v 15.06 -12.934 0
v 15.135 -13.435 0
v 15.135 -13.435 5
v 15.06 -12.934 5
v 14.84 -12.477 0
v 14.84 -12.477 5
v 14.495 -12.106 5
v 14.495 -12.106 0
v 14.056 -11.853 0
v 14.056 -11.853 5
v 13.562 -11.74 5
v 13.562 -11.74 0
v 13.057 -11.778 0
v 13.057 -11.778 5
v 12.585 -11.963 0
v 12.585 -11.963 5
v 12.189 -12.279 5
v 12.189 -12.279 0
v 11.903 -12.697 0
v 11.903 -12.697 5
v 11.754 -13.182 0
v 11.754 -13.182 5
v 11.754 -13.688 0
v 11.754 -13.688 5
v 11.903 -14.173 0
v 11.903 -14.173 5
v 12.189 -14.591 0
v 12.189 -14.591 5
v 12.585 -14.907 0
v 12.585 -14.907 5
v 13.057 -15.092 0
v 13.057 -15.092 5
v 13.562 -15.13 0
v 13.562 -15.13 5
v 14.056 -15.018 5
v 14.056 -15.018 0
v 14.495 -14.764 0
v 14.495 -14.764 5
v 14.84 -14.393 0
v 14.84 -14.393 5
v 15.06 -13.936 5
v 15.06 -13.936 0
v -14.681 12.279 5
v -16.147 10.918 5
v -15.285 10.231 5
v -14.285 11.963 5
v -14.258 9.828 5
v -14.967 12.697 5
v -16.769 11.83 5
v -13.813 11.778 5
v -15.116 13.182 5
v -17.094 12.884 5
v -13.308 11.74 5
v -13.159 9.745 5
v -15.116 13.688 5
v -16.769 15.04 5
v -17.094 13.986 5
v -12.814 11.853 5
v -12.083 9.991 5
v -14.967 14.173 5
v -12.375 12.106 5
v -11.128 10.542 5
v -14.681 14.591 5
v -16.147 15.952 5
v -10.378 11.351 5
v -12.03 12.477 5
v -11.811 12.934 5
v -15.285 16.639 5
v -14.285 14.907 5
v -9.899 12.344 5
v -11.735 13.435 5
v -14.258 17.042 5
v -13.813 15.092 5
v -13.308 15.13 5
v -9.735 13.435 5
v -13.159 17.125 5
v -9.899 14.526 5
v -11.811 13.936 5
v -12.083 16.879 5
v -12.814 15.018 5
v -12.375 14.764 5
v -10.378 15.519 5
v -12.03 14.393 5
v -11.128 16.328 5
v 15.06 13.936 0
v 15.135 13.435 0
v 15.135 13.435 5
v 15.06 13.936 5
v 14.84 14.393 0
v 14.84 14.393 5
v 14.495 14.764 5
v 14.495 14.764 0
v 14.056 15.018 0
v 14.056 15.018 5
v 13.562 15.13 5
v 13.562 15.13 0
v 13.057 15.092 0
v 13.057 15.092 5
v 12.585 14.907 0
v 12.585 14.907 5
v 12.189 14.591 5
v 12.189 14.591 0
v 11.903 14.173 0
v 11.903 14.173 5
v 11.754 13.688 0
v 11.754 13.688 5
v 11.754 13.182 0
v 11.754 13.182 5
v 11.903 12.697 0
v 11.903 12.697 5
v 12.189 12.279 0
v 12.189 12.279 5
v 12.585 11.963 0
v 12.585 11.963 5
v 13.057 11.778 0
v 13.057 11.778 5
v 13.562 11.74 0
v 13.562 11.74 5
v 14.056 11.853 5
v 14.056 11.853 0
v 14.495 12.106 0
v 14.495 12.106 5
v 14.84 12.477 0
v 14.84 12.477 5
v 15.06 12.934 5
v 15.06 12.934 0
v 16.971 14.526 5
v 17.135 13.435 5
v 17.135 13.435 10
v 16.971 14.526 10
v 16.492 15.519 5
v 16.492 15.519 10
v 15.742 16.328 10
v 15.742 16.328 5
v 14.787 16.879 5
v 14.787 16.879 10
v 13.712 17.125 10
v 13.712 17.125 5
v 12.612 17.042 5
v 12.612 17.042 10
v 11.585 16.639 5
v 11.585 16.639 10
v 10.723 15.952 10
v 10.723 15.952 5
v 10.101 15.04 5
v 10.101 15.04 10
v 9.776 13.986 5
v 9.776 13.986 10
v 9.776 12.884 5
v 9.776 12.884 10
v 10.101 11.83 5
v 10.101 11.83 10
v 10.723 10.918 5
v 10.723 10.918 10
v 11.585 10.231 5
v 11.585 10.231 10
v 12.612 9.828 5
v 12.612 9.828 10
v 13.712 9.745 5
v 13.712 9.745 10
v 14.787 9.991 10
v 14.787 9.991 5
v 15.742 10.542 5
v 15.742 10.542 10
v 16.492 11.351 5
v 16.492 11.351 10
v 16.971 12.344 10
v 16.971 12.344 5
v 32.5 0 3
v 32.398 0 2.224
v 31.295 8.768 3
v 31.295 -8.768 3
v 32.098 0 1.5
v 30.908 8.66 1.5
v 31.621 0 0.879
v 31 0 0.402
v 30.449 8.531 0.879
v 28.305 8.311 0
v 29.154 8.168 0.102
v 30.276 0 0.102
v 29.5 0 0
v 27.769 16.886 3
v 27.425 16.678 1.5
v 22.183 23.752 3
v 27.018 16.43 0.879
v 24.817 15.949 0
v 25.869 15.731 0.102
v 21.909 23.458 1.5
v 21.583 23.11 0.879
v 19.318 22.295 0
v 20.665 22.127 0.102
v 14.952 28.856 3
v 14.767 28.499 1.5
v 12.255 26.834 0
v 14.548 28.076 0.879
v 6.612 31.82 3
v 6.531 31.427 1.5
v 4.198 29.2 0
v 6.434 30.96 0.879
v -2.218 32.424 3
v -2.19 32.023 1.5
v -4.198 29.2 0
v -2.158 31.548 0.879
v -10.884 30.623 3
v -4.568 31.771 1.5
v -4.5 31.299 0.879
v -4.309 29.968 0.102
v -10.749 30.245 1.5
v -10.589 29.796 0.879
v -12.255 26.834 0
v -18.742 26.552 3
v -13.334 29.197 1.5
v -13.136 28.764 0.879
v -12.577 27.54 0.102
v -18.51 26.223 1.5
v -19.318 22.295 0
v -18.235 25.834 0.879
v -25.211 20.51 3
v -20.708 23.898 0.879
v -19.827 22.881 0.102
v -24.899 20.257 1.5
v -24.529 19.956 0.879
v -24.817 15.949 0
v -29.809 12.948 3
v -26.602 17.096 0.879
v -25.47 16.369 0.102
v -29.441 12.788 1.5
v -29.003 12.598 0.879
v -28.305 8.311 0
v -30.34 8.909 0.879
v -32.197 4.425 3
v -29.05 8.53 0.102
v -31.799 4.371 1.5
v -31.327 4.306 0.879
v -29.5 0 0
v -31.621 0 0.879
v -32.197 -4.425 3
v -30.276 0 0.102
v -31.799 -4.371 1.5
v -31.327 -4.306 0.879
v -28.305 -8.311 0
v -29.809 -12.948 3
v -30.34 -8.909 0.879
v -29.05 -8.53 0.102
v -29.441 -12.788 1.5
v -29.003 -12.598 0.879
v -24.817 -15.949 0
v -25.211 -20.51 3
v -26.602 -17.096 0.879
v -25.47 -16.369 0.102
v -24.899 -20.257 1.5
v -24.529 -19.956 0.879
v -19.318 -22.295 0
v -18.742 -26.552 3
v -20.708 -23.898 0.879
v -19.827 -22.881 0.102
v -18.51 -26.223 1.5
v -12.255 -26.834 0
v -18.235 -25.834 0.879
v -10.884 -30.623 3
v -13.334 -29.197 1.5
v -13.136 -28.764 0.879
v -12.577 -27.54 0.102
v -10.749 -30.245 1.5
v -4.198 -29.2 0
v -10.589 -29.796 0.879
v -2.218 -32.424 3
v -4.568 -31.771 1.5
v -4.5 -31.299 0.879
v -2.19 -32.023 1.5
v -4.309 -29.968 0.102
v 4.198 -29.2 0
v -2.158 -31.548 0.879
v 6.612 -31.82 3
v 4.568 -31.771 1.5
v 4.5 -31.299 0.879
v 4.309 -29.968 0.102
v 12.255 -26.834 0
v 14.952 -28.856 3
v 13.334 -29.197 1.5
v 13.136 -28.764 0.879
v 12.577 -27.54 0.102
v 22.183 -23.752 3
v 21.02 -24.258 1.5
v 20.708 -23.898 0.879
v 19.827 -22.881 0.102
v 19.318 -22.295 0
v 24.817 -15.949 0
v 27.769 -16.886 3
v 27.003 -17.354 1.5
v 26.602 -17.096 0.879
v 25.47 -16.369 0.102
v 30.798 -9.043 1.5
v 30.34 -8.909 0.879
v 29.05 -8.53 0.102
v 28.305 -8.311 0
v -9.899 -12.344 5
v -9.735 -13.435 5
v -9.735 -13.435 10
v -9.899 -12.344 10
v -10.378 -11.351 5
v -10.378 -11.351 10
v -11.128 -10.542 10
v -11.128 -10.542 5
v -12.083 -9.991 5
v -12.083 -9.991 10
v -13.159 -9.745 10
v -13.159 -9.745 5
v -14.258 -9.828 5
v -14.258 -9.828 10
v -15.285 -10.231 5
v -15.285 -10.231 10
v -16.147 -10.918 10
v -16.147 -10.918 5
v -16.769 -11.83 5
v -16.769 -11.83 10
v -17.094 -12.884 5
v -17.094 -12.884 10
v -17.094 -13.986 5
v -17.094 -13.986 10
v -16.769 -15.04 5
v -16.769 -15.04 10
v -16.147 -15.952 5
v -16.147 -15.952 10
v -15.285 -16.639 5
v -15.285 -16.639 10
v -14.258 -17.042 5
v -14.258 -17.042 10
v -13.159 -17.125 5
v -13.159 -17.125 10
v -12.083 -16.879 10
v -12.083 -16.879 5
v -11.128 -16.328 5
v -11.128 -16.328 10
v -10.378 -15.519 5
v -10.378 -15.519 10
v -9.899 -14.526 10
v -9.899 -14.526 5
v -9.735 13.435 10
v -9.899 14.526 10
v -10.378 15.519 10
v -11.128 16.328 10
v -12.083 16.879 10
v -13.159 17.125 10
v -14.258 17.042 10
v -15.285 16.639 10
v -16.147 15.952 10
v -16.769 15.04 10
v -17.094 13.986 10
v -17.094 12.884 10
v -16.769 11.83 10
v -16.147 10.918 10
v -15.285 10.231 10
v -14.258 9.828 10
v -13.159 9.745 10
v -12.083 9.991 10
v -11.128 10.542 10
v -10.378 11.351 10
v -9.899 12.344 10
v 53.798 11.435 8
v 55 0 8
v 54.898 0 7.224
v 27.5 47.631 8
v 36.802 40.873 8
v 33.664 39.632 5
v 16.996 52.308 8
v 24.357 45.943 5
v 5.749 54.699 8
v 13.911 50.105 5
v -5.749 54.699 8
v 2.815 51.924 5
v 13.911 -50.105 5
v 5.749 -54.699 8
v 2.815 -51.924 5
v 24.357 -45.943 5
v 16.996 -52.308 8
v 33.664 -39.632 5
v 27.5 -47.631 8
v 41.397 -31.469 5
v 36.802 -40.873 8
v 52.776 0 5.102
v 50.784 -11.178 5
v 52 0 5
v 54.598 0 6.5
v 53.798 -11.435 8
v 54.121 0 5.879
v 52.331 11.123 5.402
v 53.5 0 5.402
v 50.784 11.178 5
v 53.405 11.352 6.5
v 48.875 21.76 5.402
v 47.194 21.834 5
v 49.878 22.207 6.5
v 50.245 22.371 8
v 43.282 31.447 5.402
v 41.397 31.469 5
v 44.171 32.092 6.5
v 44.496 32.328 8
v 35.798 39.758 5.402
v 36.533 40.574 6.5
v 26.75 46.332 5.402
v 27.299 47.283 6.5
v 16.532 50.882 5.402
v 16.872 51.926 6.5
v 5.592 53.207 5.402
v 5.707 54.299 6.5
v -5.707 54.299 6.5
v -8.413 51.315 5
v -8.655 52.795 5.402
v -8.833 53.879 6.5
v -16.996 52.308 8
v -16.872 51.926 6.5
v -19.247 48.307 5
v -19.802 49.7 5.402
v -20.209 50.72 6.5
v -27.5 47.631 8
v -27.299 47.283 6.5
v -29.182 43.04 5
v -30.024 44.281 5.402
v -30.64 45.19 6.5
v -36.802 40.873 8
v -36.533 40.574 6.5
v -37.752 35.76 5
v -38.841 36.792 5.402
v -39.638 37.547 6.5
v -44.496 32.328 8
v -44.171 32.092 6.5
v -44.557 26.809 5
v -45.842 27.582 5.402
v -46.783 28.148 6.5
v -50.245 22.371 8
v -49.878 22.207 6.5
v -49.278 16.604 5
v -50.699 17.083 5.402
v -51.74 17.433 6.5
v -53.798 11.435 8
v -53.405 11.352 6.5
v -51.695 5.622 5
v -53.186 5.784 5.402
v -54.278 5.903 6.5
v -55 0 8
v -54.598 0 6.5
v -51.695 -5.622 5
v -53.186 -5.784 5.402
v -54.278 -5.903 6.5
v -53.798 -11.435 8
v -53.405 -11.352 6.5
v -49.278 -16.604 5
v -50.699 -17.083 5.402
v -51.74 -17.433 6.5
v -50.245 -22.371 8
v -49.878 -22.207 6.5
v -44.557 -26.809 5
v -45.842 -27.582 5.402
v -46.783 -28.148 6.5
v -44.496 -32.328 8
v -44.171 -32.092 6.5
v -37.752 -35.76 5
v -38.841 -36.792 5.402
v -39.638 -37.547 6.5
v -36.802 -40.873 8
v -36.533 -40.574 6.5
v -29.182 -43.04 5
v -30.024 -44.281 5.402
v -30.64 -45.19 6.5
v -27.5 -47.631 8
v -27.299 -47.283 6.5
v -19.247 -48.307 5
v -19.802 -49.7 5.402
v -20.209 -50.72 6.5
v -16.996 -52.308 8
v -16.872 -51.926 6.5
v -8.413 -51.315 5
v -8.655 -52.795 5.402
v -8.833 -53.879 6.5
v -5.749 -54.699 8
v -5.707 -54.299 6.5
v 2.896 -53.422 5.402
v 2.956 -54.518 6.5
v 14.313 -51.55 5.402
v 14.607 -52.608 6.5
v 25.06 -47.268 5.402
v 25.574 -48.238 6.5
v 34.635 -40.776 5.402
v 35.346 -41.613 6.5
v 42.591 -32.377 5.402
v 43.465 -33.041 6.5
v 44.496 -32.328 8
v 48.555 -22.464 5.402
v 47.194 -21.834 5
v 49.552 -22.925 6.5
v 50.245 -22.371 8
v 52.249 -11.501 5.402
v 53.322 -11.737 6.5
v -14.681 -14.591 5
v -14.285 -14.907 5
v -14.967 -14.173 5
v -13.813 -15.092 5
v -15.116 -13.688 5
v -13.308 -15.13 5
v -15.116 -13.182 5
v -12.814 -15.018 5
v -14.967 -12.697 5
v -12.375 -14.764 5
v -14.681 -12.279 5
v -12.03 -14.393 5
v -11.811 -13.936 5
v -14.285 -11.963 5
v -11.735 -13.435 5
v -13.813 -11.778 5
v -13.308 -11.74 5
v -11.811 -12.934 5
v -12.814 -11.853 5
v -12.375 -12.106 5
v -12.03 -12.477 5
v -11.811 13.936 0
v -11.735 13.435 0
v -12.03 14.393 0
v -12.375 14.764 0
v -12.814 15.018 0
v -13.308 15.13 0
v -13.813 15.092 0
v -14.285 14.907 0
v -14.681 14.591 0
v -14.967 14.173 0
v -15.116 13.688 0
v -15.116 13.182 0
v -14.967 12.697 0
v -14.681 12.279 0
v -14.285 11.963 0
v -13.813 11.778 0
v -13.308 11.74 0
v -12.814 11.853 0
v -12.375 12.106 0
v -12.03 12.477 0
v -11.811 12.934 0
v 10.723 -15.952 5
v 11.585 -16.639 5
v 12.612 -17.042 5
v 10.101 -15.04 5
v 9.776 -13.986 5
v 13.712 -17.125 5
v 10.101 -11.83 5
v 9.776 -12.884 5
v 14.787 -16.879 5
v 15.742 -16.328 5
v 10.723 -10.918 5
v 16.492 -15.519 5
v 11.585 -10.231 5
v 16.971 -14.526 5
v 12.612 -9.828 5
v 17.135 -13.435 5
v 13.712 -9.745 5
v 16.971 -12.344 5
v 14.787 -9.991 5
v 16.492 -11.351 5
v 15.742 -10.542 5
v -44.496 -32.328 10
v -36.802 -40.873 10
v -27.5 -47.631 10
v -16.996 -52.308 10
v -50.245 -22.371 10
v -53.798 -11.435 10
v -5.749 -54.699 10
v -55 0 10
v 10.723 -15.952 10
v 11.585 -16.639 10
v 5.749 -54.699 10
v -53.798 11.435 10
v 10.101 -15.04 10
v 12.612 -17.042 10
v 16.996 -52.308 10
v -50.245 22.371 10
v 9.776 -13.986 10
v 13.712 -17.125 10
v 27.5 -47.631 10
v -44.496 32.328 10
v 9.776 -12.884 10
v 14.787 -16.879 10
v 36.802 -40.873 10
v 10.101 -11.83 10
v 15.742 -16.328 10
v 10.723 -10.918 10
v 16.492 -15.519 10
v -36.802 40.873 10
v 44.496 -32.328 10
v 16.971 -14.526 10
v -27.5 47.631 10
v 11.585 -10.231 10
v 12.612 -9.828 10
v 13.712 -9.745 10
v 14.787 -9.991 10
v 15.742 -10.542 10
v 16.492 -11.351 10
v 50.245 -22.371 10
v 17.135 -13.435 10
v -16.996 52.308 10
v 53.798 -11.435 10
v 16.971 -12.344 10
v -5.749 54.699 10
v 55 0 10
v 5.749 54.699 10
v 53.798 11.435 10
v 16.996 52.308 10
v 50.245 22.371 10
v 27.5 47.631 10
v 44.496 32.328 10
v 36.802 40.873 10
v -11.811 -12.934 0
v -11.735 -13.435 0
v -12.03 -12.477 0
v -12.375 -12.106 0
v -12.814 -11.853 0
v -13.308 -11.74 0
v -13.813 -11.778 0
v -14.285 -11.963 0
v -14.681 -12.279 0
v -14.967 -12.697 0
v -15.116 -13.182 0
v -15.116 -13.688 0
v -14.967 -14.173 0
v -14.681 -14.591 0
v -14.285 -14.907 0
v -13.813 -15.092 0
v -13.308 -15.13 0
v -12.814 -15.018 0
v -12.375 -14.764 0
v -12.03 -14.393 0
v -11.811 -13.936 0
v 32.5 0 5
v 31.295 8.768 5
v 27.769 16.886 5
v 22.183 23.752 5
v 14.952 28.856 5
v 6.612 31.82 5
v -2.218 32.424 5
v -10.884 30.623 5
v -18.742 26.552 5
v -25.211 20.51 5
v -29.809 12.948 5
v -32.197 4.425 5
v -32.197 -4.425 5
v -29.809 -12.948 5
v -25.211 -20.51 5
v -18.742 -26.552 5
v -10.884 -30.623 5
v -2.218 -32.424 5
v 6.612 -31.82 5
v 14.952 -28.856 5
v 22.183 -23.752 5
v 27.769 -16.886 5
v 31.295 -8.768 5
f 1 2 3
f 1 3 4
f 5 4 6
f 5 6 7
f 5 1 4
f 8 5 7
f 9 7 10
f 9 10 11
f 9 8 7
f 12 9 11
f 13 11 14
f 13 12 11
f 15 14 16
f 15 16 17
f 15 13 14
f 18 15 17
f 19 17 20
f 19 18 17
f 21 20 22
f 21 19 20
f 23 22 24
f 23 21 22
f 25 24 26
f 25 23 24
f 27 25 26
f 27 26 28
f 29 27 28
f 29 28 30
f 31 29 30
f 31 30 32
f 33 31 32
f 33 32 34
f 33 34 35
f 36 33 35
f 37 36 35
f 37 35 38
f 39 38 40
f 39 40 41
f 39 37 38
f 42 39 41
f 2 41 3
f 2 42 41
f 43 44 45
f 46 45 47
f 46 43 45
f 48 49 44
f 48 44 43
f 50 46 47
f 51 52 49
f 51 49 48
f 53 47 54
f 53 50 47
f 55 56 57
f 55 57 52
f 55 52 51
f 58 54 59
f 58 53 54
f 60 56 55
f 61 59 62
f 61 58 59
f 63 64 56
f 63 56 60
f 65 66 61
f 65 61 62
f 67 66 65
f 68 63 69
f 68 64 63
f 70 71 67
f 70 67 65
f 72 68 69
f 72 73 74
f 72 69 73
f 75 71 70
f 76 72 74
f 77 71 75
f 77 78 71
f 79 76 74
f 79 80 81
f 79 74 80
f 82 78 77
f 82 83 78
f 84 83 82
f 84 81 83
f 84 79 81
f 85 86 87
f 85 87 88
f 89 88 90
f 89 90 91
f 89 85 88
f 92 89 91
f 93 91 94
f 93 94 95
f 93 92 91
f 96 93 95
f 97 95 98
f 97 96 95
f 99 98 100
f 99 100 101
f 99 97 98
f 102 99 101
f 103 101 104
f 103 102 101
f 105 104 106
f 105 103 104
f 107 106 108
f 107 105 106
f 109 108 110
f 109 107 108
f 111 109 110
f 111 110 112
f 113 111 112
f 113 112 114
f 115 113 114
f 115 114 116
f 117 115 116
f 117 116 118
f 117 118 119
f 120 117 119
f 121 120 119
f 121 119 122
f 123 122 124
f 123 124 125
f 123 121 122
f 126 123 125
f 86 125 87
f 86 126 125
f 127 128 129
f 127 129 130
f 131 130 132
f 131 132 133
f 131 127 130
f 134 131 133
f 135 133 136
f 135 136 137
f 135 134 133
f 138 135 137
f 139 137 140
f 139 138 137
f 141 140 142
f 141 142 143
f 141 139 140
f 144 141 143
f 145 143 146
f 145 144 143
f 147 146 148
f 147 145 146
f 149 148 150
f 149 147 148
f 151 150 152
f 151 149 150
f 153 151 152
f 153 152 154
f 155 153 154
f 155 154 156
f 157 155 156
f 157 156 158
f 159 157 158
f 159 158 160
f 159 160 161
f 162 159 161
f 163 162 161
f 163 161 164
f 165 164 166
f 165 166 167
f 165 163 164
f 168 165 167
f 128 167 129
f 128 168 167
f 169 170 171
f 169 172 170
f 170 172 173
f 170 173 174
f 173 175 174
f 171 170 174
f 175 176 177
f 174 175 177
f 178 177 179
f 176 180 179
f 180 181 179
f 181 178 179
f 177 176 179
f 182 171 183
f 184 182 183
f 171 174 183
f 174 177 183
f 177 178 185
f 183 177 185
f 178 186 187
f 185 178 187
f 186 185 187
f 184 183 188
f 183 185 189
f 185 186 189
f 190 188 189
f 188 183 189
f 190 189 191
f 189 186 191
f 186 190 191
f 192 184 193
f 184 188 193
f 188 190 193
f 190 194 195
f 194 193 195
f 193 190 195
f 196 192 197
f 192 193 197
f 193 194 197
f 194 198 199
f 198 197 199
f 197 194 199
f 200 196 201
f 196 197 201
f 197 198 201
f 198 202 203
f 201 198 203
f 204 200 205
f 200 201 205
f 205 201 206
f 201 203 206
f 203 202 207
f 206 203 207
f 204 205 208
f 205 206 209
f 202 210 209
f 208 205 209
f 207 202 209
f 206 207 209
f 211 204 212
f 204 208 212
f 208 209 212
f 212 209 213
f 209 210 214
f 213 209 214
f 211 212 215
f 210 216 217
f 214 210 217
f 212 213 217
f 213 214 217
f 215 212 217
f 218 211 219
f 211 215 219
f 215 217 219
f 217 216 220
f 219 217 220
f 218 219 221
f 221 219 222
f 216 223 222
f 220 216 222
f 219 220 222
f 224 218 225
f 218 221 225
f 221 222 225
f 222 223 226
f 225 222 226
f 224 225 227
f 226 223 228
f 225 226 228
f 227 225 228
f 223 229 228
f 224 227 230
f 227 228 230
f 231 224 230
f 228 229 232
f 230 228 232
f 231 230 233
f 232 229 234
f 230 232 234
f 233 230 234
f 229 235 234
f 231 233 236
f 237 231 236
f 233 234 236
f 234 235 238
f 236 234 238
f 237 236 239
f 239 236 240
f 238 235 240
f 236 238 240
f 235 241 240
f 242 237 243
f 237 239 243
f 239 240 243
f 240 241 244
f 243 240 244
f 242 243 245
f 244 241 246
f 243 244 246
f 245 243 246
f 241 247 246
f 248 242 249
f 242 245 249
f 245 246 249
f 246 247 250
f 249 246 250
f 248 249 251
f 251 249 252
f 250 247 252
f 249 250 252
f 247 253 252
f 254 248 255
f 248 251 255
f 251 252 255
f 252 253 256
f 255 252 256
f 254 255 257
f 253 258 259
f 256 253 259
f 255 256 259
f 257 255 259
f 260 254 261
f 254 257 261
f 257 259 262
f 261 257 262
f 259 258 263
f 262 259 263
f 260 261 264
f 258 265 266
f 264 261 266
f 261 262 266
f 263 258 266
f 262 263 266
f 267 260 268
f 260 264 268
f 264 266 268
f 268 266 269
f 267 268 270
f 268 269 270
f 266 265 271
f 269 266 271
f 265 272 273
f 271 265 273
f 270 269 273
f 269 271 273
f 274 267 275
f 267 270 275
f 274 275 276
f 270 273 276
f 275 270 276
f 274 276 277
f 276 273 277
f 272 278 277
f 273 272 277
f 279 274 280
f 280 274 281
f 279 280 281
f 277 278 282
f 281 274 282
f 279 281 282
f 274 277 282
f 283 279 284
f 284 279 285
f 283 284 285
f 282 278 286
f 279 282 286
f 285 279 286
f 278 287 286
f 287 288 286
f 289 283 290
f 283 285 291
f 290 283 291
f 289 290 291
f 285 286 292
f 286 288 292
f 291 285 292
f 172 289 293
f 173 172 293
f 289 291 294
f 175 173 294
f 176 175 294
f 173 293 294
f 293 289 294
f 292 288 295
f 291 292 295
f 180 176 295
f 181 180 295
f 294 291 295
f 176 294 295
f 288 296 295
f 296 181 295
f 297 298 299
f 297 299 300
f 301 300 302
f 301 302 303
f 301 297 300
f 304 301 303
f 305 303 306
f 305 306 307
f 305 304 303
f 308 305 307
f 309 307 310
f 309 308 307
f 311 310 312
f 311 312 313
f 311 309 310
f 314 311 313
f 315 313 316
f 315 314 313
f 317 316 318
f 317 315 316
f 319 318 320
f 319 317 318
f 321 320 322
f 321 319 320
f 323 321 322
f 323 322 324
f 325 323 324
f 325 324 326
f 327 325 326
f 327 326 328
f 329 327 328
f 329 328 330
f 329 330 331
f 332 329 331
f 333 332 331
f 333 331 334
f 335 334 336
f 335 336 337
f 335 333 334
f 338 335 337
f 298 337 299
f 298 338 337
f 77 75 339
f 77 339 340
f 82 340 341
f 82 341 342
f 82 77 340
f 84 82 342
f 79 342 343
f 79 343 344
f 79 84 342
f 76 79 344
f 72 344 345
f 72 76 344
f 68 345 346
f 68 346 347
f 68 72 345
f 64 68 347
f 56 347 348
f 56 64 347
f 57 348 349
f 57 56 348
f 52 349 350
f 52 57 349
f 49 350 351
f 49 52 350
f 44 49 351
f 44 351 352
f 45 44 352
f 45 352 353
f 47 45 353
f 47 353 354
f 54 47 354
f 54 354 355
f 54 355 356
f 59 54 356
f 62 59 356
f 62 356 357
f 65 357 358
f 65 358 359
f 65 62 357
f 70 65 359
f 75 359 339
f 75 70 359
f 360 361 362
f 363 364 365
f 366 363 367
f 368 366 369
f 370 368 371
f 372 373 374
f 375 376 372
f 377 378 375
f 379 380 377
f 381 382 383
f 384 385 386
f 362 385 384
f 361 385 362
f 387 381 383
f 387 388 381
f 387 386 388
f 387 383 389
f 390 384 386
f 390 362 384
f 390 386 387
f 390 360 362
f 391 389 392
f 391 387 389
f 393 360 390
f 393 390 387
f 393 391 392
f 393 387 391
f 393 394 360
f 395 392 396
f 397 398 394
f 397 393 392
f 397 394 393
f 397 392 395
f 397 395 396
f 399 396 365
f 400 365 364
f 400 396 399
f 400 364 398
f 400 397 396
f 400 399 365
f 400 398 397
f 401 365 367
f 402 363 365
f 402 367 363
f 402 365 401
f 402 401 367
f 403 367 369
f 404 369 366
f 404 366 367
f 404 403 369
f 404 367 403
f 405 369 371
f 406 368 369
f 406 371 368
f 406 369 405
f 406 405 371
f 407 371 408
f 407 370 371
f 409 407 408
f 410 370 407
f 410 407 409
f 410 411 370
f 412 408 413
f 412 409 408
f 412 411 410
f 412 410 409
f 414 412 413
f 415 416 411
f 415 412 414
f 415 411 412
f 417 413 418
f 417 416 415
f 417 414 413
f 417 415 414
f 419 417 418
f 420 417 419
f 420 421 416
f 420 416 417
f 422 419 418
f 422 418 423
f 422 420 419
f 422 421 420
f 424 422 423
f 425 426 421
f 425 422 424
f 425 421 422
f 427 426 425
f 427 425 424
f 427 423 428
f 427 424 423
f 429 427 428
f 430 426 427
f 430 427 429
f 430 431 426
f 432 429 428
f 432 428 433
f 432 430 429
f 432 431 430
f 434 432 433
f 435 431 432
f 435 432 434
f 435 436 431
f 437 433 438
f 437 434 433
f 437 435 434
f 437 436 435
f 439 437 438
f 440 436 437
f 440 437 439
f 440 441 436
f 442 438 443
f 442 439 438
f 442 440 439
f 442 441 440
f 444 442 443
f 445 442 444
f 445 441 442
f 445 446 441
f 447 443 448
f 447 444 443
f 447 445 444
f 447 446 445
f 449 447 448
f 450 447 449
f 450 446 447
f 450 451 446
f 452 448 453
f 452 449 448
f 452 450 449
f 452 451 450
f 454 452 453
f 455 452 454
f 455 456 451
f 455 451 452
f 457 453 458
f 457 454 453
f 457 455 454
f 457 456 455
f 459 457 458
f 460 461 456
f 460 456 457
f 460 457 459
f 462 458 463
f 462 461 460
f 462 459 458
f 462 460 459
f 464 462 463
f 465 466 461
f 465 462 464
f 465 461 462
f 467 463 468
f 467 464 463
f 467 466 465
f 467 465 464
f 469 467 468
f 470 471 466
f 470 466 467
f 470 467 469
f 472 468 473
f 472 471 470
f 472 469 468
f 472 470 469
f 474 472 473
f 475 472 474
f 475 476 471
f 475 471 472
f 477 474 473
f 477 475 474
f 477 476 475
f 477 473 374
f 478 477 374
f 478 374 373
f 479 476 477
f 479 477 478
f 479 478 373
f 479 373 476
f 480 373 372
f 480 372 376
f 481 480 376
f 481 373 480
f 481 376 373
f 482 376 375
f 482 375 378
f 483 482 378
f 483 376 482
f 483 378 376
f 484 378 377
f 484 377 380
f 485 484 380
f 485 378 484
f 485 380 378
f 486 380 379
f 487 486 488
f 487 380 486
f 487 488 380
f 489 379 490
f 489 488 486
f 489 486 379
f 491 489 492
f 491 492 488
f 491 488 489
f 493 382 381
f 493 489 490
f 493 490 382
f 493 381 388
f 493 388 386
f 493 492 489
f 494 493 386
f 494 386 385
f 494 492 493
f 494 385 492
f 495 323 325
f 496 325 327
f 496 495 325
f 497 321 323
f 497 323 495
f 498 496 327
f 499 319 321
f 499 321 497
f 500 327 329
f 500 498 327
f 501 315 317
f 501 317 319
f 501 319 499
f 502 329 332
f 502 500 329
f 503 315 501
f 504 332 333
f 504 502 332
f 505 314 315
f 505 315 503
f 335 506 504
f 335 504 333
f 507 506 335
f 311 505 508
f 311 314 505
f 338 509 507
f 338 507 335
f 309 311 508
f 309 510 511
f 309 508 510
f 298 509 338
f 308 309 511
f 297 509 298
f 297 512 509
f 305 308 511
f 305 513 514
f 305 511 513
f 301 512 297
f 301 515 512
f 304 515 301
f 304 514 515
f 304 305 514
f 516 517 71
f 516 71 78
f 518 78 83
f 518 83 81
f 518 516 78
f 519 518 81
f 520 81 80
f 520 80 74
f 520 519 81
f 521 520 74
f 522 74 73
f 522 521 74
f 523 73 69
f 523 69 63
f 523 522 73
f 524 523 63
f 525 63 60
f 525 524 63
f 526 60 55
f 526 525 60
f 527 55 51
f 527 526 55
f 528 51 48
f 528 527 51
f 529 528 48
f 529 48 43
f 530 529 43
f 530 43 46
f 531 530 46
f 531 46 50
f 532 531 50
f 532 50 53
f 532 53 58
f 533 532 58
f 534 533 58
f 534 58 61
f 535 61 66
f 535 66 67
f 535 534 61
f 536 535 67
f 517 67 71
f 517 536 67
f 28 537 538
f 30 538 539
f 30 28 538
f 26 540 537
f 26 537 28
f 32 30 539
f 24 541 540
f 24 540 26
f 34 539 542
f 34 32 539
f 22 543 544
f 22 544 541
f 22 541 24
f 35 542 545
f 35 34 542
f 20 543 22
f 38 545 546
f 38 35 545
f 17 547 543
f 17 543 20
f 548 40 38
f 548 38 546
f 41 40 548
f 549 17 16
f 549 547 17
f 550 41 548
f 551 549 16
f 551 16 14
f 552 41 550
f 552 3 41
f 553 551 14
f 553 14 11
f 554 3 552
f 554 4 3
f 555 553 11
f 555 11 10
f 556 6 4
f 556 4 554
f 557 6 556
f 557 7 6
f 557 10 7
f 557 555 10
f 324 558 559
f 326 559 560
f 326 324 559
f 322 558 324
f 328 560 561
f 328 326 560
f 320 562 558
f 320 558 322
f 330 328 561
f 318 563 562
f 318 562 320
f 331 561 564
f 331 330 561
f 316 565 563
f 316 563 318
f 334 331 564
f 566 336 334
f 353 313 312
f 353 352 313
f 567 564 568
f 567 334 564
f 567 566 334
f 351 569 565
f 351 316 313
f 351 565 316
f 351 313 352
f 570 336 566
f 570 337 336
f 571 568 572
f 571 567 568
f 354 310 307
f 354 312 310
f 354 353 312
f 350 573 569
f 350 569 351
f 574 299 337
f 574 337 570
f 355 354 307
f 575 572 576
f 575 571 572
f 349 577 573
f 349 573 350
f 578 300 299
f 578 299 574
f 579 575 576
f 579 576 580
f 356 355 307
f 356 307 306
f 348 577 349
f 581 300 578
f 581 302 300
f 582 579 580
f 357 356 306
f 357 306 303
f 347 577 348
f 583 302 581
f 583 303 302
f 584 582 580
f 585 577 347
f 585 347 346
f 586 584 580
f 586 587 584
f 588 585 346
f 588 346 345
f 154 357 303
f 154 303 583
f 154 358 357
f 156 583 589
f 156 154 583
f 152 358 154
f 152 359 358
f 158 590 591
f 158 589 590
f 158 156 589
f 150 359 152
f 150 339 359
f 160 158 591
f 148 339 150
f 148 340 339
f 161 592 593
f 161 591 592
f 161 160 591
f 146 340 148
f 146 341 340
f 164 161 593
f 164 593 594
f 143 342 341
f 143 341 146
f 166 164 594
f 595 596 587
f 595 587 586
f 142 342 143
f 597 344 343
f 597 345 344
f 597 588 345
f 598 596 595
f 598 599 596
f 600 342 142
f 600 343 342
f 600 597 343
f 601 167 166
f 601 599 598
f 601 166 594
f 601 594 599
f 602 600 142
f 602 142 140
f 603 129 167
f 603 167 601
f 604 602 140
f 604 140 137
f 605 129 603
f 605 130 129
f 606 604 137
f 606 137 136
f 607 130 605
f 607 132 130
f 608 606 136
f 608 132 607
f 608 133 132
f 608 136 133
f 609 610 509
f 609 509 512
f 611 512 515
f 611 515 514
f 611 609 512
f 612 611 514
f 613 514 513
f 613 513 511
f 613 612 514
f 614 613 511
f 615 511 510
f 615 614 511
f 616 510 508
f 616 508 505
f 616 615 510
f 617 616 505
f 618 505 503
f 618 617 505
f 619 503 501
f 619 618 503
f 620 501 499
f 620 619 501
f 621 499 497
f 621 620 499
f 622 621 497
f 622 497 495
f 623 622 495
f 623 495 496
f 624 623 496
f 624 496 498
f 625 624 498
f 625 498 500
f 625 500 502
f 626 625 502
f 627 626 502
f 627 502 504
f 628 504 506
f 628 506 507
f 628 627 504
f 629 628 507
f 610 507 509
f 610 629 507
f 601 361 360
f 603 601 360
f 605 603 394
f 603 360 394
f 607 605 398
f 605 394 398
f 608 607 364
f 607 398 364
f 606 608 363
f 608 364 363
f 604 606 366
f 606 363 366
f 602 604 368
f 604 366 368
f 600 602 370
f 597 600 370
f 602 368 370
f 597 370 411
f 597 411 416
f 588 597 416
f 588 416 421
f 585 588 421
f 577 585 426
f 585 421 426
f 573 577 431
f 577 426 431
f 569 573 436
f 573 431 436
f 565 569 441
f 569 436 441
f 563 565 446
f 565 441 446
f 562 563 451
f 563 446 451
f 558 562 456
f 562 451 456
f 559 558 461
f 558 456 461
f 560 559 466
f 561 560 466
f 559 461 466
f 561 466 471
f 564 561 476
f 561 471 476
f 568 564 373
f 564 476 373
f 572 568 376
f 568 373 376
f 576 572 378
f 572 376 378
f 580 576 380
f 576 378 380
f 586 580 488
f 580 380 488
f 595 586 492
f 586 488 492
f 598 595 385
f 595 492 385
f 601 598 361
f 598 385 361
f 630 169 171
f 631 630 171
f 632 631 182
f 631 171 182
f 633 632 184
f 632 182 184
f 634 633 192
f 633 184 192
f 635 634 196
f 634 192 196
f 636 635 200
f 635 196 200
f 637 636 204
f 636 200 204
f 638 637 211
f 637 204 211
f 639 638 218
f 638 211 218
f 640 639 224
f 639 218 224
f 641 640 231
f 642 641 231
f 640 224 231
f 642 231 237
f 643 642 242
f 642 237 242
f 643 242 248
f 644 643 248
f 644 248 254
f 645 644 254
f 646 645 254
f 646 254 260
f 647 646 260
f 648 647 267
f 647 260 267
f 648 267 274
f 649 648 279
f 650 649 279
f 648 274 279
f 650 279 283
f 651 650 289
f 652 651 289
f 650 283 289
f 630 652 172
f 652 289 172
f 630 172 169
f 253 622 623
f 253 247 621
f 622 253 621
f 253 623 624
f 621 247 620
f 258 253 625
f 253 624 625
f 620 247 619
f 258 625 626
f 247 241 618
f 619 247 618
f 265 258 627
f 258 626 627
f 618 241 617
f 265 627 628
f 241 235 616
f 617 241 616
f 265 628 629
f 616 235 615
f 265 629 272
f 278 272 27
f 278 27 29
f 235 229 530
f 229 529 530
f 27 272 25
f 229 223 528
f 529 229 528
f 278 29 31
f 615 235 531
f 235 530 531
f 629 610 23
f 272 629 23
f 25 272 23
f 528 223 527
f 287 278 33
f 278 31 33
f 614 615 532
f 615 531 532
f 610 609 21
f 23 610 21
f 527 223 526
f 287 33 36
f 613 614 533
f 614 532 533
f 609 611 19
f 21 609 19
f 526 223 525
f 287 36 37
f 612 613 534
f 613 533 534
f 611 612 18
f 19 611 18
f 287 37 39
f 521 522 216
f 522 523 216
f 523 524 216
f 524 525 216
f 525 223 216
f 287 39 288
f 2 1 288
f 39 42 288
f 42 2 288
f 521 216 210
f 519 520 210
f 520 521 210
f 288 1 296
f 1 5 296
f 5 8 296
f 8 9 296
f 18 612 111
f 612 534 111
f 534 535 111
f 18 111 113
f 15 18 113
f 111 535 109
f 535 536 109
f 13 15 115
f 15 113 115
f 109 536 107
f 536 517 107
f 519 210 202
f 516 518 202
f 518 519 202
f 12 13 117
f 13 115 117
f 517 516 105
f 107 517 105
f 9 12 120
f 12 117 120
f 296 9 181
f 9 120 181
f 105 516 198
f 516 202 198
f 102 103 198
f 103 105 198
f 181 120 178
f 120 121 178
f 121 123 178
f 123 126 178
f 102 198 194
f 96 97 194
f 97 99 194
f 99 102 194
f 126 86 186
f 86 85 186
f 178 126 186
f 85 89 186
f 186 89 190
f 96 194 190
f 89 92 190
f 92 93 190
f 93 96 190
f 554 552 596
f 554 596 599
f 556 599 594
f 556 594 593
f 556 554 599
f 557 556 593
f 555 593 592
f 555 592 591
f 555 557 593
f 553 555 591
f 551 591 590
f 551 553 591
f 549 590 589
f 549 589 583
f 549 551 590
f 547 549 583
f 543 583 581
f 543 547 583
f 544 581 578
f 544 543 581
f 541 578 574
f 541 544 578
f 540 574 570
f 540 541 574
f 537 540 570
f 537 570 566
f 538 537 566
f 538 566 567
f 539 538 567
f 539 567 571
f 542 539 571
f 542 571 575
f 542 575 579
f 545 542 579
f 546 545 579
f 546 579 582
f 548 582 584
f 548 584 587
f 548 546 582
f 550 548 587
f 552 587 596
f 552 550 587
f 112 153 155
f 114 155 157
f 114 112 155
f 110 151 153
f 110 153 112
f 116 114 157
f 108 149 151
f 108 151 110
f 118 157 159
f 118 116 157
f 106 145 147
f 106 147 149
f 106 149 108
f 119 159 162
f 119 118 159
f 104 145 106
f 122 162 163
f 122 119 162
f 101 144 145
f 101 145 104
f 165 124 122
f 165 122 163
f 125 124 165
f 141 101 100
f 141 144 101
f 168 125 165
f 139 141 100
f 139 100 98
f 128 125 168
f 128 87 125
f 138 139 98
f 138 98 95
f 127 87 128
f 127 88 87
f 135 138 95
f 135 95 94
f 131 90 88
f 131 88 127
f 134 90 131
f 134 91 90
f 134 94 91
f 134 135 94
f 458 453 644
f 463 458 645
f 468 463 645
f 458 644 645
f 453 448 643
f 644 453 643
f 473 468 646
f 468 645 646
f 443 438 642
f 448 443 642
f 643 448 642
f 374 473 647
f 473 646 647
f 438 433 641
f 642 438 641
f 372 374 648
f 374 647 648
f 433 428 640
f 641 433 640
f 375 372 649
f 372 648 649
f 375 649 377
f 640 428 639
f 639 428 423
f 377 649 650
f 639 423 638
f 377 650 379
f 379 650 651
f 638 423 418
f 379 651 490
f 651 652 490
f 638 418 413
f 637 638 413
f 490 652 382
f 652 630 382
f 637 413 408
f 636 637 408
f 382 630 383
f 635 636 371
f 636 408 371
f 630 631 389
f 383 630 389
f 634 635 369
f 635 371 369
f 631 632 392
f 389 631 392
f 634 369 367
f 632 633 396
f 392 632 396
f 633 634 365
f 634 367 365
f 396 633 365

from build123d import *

# Parameters (mm, degrees)
SKETCH_1_R      = 32.5
SKETCH_1_R_2    = 1.7
EXTRUDE_1_DEPTH = 5
SKETCH_2_R      = 55
SKETCH_2_R_2    = 3.7
EXTRUDE_2_DEPTH = 5
FILLET_2_R      = 3
FILLET_3_R      = 3


with BuildPart() as part:
    # 草图1 → 凸台-拉伸1 (new body)
    with BuildSketch(Plane.XY):
        Circle(SKETCH_1_R)
        with Locations((-13.435028843, 13.435028843)):
            Circle(SKETCH_1_R_2, mode=Mode.SUBTRACT)
        with Locations((-13.435028843, -13.435028843)):
            Circle(SKETCH_1_R_2, mode=Mode.SUBTRACT)
        with Locations((13.435028843, -13.435028843)):
            Circle(SKETCH_1_R_2, mode=Mode.SUBTRACT)
        with Locations((13.435028843, 13.435028843)):
            Circle(SKETCH_1_R_2, mode=Mode.SUBTRACT)
    extrude(amount=EXTRUDE_1_DEPTH)

    # 草图2 → 凸台-拉伸2 (add)
    with BuildSketch(Plane.XY.offset(5)):
        Circle(SKETCH_2_R)
        with Locations((13.435028843, -13.435028843)):
            Circle(SKETCH_2_R_2, mode=Mode.SUBTRACT)
        with Locations((-13.435028843, 13.435028843)):
            Circle(SKETCH_2_R_2, mode=Mode.SUBTRACT)
        with Locations((-13.435028843, -13.435028843)):
            Circle(SKETCH_2_R_2, mode=Mode.SUBTRACT)
        with Locations((13.435028843, 13.435028843)):
            Circle(SKETCH_2_R_2, mode=Mode.SUBTRACT)
    extrude(amount=EXTRUDE_2_DEPTH)

    # 圆角2
    fillet_2_edges = [part.edges().sort_by_distance(p)[0] for p in [
        (-32.5, 0, 0),
    ]]
    fillet(fillet_2_edges, radius=FILLET_2_R)

    # 圆角3
    fillet_3_edges = [part.edges().sort_by_distance(p)[0] for p in [
        (-55, 0, 5),
    ]]
    fillet(fillet_3_edges, radius=FILLET_3_R)


solid = part.part
